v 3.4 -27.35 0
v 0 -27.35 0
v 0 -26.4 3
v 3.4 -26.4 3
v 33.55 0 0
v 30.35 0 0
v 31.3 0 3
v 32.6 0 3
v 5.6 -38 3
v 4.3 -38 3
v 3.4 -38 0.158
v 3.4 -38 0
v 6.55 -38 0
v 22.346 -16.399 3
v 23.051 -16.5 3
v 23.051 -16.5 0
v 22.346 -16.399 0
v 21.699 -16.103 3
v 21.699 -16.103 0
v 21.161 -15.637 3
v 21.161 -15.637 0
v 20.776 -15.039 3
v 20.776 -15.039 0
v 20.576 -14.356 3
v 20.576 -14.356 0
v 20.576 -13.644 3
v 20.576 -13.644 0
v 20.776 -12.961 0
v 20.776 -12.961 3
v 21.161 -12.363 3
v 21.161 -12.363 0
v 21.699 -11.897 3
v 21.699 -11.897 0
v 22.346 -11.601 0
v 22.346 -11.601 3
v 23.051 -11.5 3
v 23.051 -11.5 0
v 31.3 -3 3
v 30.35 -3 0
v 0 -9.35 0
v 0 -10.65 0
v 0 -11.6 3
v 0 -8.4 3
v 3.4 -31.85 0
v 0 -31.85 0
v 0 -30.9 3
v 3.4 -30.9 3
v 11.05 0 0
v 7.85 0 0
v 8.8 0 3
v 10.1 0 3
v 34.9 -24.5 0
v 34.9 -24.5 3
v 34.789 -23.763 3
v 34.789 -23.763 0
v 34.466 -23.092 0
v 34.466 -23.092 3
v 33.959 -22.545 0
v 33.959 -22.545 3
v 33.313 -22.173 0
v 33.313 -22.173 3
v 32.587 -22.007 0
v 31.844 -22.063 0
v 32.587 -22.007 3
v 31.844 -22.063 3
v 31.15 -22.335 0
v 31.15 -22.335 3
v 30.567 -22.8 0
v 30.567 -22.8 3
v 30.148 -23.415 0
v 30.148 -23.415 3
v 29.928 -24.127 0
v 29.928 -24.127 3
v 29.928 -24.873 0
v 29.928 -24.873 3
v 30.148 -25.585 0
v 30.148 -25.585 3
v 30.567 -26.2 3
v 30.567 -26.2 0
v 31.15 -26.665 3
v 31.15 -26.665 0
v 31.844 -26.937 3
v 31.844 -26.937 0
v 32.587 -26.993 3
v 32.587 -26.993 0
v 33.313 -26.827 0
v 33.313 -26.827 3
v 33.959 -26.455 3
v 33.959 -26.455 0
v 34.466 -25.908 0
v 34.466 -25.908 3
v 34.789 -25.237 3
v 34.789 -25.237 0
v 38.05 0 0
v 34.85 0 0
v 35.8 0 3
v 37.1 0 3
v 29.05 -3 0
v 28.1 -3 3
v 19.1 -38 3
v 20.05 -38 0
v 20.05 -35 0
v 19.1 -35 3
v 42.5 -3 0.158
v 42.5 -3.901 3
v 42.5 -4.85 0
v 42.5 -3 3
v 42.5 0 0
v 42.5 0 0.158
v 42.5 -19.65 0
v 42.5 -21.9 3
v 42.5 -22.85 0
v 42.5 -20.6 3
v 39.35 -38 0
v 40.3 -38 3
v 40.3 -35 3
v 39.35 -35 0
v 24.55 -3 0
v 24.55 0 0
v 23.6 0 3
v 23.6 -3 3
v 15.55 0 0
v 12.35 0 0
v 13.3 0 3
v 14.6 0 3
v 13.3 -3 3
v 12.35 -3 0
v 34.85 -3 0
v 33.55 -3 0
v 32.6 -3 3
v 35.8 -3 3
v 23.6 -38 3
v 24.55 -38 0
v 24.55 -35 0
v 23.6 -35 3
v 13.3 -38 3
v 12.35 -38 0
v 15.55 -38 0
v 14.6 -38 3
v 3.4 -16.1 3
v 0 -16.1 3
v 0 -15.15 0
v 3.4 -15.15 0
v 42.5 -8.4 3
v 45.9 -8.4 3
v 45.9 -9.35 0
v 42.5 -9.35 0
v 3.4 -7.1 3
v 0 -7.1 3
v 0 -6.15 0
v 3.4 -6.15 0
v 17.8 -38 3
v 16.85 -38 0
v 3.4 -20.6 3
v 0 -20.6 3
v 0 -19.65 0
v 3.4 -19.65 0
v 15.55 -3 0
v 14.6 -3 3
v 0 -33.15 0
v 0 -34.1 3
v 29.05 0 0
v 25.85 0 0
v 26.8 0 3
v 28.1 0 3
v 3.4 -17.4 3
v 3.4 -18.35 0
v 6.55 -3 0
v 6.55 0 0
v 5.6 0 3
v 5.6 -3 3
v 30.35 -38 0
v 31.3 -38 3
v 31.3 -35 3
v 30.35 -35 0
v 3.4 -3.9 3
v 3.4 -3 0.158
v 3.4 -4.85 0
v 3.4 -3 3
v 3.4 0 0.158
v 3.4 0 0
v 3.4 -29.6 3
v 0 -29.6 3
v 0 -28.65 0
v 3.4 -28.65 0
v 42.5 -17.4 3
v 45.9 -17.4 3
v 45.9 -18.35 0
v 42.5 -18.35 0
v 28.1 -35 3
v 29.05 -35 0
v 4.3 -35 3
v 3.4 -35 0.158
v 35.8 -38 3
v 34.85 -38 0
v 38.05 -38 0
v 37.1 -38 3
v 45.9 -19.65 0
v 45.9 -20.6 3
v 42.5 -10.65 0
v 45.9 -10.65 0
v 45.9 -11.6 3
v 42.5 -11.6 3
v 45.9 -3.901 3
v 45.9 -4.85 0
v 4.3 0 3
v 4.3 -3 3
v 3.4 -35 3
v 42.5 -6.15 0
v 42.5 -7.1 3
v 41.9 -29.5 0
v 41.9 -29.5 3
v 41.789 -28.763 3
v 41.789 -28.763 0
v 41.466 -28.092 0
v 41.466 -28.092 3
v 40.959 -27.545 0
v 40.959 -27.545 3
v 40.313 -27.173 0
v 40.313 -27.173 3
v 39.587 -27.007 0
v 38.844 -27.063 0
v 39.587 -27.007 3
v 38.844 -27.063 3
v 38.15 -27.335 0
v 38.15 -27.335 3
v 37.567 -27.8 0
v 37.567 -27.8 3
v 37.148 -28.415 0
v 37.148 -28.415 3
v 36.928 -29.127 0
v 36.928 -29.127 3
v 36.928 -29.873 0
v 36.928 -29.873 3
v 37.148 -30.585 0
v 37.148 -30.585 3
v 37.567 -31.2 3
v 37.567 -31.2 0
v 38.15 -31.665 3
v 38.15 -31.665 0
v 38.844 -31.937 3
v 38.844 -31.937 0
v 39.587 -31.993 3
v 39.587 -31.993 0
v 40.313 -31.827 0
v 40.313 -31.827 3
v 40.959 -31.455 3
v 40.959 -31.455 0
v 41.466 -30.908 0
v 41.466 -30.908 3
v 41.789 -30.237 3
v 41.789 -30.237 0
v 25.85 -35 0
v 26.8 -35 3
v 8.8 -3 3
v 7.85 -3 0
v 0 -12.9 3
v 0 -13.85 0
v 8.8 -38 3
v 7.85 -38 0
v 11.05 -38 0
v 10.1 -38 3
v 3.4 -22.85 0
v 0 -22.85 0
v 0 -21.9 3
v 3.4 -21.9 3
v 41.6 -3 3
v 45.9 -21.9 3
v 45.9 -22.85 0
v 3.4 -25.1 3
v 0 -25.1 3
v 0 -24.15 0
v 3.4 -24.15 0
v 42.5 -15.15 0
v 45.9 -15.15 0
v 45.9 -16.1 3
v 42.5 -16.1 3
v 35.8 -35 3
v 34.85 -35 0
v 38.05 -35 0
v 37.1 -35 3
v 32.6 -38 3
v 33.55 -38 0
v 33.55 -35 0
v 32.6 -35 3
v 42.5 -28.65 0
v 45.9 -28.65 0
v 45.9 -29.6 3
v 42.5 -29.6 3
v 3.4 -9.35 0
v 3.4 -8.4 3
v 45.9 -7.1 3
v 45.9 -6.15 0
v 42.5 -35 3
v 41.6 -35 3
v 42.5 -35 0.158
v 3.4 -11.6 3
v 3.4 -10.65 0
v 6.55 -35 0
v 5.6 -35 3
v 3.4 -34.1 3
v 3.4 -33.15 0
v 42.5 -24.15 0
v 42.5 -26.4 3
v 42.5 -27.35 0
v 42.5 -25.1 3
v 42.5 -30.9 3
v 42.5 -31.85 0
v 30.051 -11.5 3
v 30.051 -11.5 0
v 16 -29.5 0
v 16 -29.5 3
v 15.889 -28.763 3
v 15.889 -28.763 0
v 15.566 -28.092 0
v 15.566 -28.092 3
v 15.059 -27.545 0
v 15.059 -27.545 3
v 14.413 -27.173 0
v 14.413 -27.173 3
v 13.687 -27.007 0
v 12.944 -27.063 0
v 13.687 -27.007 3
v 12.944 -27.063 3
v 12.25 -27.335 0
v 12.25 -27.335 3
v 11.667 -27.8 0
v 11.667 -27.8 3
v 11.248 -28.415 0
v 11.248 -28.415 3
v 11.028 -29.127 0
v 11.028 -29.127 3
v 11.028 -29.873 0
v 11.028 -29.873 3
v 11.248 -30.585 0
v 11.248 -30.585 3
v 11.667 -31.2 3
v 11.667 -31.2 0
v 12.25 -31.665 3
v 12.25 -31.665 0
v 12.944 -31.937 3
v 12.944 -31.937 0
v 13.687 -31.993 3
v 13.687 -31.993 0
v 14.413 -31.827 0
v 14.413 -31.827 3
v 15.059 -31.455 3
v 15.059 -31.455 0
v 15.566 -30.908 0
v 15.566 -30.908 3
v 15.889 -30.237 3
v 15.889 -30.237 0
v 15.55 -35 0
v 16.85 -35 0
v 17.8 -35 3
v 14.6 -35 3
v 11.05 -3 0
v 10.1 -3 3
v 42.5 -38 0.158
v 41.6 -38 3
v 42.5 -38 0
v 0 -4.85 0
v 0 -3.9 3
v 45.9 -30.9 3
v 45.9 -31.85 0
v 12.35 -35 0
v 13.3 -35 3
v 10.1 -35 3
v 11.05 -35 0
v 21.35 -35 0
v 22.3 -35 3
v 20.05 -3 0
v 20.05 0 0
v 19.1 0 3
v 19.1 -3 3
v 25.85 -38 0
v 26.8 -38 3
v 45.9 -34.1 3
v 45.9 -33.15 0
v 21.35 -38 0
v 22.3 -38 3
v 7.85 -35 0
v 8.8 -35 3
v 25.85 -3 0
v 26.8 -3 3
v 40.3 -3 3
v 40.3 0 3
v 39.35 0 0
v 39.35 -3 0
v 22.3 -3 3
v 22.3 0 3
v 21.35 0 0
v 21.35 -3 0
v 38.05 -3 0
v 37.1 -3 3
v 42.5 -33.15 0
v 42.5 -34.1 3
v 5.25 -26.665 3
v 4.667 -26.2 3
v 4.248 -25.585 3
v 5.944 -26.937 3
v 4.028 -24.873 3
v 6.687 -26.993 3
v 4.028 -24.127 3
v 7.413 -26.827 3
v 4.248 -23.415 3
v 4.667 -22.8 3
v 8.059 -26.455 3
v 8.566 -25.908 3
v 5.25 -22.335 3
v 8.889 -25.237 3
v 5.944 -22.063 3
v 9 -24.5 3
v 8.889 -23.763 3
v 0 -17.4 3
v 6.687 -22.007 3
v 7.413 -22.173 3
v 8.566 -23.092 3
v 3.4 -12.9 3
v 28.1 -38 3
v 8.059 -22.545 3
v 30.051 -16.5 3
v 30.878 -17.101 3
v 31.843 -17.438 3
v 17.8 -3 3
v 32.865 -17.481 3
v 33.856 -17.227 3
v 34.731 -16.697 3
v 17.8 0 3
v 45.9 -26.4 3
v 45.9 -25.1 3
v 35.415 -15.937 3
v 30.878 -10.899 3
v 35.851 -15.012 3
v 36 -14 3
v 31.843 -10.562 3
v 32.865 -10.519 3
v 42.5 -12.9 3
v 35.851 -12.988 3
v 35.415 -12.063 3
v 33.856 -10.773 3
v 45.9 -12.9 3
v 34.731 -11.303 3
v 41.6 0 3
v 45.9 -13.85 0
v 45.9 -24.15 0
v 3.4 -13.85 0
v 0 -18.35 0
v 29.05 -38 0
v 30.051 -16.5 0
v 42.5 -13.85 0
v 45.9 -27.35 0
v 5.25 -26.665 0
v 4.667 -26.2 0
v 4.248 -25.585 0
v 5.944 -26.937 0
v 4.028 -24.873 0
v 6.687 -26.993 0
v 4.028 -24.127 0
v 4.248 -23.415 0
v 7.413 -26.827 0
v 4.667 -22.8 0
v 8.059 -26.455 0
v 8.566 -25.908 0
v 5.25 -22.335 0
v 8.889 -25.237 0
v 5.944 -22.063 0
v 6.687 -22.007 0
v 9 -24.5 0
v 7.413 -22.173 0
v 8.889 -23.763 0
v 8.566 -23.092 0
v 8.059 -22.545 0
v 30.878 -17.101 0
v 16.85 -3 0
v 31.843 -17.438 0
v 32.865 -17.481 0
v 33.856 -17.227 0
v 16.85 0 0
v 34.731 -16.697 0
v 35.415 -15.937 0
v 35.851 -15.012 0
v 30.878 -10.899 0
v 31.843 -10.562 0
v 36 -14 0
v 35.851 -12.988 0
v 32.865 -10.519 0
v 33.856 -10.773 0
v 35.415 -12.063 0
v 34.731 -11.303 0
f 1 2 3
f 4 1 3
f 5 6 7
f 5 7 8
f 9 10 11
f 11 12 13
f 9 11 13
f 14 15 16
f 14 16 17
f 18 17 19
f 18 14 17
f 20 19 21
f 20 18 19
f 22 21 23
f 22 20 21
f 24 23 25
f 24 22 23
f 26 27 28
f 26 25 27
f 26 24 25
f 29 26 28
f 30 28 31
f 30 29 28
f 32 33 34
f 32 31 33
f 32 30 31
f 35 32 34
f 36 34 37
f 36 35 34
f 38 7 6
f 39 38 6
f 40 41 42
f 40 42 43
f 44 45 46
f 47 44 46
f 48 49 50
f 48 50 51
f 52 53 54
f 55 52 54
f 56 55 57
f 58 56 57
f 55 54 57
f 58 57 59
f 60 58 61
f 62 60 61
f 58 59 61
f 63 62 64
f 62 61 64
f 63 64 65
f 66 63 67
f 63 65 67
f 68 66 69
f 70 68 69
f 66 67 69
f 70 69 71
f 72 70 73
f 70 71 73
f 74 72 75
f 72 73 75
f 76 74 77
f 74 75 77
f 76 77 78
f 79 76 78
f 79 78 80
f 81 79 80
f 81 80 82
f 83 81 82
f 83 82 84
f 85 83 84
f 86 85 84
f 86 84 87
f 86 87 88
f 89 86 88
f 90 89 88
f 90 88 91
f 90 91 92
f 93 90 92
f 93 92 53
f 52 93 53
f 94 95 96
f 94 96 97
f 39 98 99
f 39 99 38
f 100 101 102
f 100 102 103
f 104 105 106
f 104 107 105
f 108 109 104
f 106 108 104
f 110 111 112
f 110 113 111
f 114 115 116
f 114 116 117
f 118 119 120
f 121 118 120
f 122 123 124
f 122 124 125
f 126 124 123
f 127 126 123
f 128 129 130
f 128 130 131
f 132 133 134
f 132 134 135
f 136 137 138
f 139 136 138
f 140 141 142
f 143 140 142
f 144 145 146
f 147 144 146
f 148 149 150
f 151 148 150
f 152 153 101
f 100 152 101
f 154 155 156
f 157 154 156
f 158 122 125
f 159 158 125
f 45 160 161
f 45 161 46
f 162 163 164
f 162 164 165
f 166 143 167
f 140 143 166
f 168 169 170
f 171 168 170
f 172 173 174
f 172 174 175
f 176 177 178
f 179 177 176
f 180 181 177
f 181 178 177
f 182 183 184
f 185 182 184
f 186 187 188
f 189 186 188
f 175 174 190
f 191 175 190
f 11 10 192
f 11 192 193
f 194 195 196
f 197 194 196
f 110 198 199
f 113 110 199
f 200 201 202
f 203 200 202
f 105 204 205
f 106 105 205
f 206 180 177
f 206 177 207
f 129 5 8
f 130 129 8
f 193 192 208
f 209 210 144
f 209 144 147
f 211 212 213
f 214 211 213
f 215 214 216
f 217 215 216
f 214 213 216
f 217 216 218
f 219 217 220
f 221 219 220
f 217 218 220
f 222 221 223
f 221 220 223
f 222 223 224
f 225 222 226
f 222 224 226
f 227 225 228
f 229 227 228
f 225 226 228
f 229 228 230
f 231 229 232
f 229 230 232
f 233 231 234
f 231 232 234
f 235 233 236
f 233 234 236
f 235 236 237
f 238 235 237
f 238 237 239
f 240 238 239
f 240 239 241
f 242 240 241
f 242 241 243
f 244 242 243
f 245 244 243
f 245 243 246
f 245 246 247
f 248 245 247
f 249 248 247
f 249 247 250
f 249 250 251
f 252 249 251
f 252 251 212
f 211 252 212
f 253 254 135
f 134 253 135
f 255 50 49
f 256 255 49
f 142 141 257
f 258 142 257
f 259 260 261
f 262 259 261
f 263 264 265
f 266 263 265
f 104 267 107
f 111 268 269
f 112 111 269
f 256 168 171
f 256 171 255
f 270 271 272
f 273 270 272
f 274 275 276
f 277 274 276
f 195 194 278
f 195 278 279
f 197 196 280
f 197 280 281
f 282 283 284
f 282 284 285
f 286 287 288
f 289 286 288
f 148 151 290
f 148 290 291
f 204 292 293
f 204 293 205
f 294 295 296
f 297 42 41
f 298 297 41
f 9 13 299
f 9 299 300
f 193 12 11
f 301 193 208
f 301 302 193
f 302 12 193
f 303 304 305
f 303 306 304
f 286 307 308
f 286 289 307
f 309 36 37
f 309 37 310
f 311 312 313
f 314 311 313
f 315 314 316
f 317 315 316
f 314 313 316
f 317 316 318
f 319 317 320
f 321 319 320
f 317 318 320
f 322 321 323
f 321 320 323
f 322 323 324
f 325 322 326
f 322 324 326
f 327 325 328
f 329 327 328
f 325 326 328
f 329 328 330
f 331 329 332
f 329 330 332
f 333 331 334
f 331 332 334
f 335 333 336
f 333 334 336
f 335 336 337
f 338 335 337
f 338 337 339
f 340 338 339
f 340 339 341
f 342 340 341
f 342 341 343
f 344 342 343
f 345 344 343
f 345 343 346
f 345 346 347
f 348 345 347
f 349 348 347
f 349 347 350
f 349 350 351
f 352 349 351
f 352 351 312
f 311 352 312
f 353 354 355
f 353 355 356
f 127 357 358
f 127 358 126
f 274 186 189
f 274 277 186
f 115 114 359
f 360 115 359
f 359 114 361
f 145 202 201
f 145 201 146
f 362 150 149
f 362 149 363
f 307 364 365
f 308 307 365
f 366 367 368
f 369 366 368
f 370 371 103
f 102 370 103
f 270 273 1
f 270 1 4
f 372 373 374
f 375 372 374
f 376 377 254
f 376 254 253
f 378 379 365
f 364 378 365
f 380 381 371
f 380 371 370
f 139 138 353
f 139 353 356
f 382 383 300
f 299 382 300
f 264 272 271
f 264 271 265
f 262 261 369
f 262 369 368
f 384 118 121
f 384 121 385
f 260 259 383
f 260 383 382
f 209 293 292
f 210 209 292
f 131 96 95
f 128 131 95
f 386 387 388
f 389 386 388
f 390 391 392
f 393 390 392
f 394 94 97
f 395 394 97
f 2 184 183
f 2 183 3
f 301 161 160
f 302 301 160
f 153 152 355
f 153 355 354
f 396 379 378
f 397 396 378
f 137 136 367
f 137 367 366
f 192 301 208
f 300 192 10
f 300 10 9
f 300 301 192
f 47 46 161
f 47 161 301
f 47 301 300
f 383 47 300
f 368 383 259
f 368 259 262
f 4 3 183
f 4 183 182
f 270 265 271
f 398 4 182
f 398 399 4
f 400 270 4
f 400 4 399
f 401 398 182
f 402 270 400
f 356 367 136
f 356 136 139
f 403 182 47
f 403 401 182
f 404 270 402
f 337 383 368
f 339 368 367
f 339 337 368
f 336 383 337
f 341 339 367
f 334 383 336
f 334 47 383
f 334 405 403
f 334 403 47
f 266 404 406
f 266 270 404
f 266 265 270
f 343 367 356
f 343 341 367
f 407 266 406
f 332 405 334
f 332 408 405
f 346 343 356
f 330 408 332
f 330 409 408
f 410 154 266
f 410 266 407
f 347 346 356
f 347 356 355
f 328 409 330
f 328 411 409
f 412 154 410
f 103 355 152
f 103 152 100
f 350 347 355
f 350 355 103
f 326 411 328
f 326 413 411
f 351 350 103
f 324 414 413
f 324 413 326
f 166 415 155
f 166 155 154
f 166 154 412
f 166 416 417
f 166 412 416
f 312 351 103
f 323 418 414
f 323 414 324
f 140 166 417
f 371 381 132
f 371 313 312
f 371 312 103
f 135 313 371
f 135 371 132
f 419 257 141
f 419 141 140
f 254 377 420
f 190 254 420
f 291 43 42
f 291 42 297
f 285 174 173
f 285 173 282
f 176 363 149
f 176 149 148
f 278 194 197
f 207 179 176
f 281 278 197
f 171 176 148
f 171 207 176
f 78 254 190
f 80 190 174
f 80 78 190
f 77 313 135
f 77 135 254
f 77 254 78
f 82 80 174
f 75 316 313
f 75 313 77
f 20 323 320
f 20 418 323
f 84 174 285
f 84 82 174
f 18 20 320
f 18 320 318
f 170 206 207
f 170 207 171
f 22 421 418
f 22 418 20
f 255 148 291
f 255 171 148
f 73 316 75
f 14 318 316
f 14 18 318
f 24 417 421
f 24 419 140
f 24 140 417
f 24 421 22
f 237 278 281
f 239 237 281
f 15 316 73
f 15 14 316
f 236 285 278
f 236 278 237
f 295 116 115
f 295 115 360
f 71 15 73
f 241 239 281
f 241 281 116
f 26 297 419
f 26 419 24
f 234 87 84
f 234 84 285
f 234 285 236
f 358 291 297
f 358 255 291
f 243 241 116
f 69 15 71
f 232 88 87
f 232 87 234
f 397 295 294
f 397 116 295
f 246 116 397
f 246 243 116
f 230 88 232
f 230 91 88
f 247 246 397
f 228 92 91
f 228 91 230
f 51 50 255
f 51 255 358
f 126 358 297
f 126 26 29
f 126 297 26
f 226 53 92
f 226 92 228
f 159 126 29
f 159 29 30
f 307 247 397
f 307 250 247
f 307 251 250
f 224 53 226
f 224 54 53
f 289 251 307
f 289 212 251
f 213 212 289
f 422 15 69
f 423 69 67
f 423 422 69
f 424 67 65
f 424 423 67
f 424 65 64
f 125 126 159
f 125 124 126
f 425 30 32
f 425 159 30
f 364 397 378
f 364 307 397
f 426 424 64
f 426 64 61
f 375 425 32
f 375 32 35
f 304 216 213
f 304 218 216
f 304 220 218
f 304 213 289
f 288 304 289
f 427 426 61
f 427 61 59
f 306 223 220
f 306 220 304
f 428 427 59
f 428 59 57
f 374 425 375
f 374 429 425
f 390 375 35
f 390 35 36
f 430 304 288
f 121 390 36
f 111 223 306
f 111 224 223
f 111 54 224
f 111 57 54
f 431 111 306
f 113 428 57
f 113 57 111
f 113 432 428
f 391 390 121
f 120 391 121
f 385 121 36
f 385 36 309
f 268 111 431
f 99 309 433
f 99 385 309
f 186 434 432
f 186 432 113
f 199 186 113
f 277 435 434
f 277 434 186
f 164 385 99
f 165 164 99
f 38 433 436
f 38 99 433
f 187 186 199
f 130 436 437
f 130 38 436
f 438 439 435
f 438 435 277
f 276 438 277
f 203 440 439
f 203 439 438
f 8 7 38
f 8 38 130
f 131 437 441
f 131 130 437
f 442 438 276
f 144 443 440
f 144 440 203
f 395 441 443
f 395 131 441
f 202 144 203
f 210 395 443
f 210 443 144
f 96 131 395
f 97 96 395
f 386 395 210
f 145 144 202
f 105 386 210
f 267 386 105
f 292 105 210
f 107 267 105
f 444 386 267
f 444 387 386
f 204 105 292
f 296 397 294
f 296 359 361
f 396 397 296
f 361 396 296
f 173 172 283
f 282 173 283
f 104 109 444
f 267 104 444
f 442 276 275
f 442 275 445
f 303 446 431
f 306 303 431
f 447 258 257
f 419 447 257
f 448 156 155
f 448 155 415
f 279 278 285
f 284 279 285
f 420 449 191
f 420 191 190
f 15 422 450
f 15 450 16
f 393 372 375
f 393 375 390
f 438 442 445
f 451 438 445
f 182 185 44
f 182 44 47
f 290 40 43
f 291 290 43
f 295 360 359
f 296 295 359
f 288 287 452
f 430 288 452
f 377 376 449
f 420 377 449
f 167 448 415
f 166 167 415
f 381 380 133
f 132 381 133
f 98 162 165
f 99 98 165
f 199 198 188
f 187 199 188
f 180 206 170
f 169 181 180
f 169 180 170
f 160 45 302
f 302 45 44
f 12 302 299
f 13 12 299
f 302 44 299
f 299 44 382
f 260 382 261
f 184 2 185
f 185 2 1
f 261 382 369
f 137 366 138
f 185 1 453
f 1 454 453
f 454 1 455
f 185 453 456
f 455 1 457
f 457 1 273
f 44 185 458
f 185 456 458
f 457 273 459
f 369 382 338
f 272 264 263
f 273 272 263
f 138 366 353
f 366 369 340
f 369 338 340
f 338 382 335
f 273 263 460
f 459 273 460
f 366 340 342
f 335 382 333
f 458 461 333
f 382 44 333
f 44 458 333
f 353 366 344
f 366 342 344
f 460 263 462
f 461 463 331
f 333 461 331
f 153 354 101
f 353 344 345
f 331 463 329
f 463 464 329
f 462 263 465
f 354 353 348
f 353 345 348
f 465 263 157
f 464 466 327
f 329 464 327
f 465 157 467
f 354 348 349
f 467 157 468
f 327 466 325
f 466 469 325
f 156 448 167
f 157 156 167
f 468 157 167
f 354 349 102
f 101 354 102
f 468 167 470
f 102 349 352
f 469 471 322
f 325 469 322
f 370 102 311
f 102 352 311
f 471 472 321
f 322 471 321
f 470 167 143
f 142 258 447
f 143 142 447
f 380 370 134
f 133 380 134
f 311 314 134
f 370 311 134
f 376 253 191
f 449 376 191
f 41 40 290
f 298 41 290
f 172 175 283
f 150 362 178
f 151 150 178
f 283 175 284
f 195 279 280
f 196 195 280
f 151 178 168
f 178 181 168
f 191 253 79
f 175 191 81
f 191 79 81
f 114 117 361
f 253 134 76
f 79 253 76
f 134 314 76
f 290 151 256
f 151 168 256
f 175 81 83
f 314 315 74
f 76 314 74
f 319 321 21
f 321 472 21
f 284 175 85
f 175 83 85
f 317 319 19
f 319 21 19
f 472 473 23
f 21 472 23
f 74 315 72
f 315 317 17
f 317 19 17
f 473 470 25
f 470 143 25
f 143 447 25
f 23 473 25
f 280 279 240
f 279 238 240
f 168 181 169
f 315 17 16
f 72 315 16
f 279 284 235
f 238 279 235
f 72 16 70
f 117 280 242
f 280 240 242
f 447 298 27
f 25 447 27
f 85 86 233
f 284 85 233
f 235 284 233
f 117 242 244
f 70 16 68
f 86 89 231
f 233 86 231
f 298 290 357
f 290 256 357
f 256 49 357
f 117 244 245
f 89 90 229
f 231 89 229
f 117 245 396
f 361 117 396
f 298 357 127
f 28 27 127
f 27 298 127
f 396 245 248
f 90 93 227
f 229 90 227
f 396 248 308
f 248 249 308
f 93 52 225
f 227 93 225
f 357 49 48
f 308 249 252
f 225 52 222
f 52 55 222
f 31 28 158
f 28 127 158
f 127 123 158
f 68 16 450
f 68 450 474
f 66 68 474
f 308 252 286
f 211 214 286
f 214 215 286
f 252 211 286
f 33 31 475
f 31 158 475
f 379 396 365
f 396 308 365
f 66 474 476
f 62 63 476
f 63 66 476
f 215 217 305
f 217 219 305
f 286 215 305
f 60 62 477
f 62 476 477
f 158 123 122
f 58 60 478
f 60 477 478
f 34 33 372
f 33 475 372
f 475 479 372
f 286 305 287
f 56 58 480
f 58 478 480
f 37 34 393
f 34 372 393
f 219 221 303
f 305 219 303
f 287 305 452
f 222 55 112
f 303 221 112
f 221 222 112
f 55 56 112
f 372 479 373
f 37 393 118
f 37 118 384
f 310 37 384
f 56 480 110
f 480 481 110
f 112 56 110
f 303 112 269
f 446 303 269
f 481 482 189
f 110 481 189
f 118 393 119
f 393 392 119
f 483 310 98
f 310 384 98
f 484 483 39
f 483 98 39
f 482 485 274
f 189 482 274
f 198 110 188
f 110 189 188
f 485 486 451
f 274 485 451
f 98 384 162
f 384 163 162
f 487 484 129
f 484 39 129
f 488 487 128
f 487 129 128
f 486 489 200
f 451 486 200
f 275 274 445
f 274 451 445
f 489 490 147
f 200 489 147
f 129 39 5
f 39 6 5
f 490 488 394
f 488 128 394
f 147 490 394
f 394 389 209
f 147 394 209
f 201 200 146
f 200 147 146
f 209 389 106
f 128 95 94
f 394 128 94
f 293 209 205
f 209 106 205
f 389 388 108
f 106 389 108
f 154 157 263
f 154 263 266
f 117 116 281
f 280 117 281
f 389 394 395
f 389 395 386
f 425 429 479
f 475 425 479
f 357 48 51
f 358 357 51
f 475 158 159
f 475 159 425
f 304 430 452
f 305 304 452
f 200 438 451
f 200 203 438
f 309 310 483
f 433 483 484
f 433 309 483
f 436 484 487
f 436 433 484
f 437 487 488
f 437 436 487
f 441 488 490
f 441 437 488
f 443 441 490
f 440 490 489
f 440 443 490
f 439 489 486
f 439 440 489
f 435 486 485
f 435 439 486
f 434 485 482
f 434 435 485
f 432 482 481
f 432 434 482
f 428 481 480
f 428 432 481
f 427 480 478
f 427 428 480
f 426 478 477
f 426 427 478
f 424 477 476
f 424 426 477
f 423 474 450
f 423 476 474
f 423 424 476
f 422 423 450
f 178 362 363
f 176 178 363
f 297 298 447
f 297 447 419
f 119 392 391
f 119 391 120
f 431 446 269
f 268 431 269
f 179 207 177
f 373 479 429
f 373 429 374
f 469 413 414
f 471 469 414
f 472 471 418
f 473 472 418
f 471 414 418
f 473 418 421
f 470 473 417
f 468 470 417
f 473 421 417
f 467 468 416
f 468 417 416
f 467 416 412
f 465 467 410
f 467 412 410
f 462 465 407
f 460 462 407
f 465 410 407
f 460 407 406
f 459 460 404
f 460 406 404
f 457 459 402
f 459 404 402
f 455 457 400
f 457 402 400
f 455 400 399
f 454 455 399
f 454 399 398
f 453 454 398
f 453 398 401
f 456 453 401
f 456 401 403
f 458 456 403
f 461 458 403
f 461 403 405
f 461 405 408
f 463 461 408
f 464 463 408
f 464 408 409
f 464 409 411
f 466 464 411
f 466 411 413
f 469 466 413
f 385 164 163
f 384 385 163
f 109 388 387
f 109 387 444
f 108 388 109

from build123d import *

# Parameters (mm, degrees)
SKETCH_1_W          = 45.9
SKETCH_1_H          = 38
EXTRUDE_1_DEPTH     = 3
CUT_EXTRUDE_3_DEPTH = 3.4
CUT_EXTRUDE_4_DEPTH = 3.4
CUT_EXTRUDE_5_DEPTH = 3
CUT_EXTRUDE_6_DEPTH = 3
SKETCH_9_R          = 2.5
CUT_EXTRUDE_7_DEPTH = 60.664143336


with BuildPart() as part:
    # 草图1 → 凸台-拉伸1 (new body)
    with BuildSketch(Plane.XY):
        with Locations((22.95, -19)):
            Rectangle(SKETCH_1_W, SKETCH_1_H)
    extrude(amount=EXTRUDE_1_DEPTH)

    # 草图3 → 切除-拉伸3 (cut)
    with BuildSketch(Plane.ZY):
        Polygon((3, -8.4), (3, -7.1), (0, -6.15), (0, -9.35), align=None)
        Polygon((0, -4.85), (3, -3.9), (3, 0), (0, 0), align=None)
        Polygon((3, -12.9), (3, -11.6), (0, -10.65), (0, -13.85), align=None)
        Polygon((3, -17.4), (3, -16.1), (0, -15.15), (0, -18.35), align=None)
        Polygon((3, -21.9), (3, -20.6), (0, -19.65), (0, -22.85), align=None)
        Polygon((3, -26.4), (3, -25.1), (0, -24.15), (0, -27.35), align=None)
        Polygon((3, -30.9), (3, -29.6), (0, -28.65), (0, -31.85), align=None)
        Polygon((3, -34.1), (0, -33.15), (0, -38), (3, -38), align=None)
    extrude(amount=-CUT_EXTRUDE_3_DEPTH, mode=Mode.SUBTRACT)

    # 草图5 → 切除-拉伸4 (cut)
    with BuildSketch(Plane(origin=(45.9, 0, 0), x_dir=(0, 0, -1), z_dir=(1, 0, 0))):
        Polygon((0, 0), (-3.00280668, 0), (-3.00280668, -3.9), (0, -4.85), align=None)
        Polygon((0, -6.15), (-3, -7.1), (-3, -8.4), (0, -9.35), align=None)
        Polygon((0, -33.15), (-3, -34.1), (-3, -38), (0, -38), align=None)
        Polygon((-3, -12.9), (0, -13.85), (0, -10.65), (-3, -11.6), align=None)
        Polygon((-3, -17.4), (0, -18.35), (0, -15.15), (-3, -16.1), align=None)
        Polygon((-3, -21.9), (0, -22.85), (0, -19.65), (-3, -20.6), align=None)
        Polygon((-3, -26.4), (0, -27.35), (0, -24.15), (-3, -25.1), align=None)
        Polygon((-3, -30.9), (0, -31.85), (0, -28.65), (-3, -29.6), align=None)
    extrude(amount=-CUT_EXTRUDE_4_DEPTH, mode=Mode.SUBTRACT)

    # 草图7 → 切除-拉伸5 (cut)
    with BuildSketch(Plane.XZ.offset(38)):
        Polygon((5.6, 3), (8.8, 3), (7.85, 0), (6.55, 0), align=None)
        Polygon((4.3, 3), (3.35, 0), (0, 0), (0, 3), align=None)
        Polygon((11.05, 0), (10.1, 3), (13.3, 3), (12.35, 0), align=None)
        Polygon((15.55, 0), (14.6, 3), (17.8, 3), (16.85, 0), align=None)
        Polygon((20.05, 0), (19.1, 3), (22.3, 3), (21.35, 0), align=None)
        Polygon((24.55, 0), (23.6, 3), (26.8, 3), (25.85, 0), align=None)
        Polygon((29.05, 0), (28.1, 3), (31.3, 3), (30.35, 0), align=None)
        Polygon((33.55, 0), (32.6, 3), (35.8, 3), (34.85, 0), align=None)
        Polygon((38.05, 0), (37.1, 3), (40.3, 3), (39.35, 0), align=None)
        Polygon((45.9, 0), (45.9, 3), (41.6, 3), (42.55, 0), align=None)
    extrude(amount=-CUT_EXTRUDE_5_DEPTH, mode=Mode.SUBTRACT)

    # 草图8 → 切除-拉伸6 (cut)
    with BuildSketch(Plane(origin=(0, 0, 0), x_dir=(1, 0, 0), z_dir=(0, 1, 0))):
        Polygon((6.55, 0), (5.6, -3), (8.8, -3), (7.85, 0), align=None)
        Polygon((3.35, 0), (4.3, -3), (0, -3), (0, 0), align=None)
        Polygon((12.35, 0), (11.05, 0), (10.1, -3), (13.3, -3), align=None)
        Polygon((16.85, 0), (15.55, 0), (14.6, -3), (17.8, -3), align=None)
        Polygon((21.35, 0), (20.05, 0), (19.1, -3), (22.3, -3), align=None)
        Polygon((25.85, 0), (24.55, 0), (23.6, -3), (26.8, -3), align=None)
        Polygon((30.35, 0), (29.05, 0), (28.1, -3), (31.3, -3), align=None)
        Polygon((34.85, 0), (33.55, 0), (32.6, -3), (35.8, -3), align=None)
        Polygon((39.35, 0), (38.05, 0), (37.1, -3), (40.3, -3), align=None)
        Polygon((45.9, -3), (45.9, 0), (42.55, 0), (41.6, -3), align=None)
    extrude(amount=-CUT_EXTRUDE_6_DEPTH, mode=Mode.SUBTRACT)

    # 草图9 → 切除-拉伸7 (cut, through all)
    with BuildSketch(Plane.XY.offset(3)):
        with Locations((32.4, -24.5)):
            Circle(SKETCH_9_R)
        with Locations((39.4, -29.5)):
            Circle(SKETCH_9_R)
        with Locations((6.5, -24.5)):
            Circle(SKETCH_9_R)
        with Locations((13.5, -29.5)):
            Circle(SKETCH_9_R)
        with BuildLine():
            Line((30.050510257, -16.5), (23.050510257, -16.5))
            ThreePointArc((23.050510257, -16.5), (20.550510257, -14), (23.050510257, -11.5))
            Line((23.050510257, -11.5), (30.050510257, -11.5))
            ThreePointArc((30.050510257, -11.5), (36, -14), (30.050510257, -16.5))
        make_face()
    extrude(amount=-CUT_EXTRUDE_7_DEPTH, mode=Mode.SUBTRACT)


solid = part.part
